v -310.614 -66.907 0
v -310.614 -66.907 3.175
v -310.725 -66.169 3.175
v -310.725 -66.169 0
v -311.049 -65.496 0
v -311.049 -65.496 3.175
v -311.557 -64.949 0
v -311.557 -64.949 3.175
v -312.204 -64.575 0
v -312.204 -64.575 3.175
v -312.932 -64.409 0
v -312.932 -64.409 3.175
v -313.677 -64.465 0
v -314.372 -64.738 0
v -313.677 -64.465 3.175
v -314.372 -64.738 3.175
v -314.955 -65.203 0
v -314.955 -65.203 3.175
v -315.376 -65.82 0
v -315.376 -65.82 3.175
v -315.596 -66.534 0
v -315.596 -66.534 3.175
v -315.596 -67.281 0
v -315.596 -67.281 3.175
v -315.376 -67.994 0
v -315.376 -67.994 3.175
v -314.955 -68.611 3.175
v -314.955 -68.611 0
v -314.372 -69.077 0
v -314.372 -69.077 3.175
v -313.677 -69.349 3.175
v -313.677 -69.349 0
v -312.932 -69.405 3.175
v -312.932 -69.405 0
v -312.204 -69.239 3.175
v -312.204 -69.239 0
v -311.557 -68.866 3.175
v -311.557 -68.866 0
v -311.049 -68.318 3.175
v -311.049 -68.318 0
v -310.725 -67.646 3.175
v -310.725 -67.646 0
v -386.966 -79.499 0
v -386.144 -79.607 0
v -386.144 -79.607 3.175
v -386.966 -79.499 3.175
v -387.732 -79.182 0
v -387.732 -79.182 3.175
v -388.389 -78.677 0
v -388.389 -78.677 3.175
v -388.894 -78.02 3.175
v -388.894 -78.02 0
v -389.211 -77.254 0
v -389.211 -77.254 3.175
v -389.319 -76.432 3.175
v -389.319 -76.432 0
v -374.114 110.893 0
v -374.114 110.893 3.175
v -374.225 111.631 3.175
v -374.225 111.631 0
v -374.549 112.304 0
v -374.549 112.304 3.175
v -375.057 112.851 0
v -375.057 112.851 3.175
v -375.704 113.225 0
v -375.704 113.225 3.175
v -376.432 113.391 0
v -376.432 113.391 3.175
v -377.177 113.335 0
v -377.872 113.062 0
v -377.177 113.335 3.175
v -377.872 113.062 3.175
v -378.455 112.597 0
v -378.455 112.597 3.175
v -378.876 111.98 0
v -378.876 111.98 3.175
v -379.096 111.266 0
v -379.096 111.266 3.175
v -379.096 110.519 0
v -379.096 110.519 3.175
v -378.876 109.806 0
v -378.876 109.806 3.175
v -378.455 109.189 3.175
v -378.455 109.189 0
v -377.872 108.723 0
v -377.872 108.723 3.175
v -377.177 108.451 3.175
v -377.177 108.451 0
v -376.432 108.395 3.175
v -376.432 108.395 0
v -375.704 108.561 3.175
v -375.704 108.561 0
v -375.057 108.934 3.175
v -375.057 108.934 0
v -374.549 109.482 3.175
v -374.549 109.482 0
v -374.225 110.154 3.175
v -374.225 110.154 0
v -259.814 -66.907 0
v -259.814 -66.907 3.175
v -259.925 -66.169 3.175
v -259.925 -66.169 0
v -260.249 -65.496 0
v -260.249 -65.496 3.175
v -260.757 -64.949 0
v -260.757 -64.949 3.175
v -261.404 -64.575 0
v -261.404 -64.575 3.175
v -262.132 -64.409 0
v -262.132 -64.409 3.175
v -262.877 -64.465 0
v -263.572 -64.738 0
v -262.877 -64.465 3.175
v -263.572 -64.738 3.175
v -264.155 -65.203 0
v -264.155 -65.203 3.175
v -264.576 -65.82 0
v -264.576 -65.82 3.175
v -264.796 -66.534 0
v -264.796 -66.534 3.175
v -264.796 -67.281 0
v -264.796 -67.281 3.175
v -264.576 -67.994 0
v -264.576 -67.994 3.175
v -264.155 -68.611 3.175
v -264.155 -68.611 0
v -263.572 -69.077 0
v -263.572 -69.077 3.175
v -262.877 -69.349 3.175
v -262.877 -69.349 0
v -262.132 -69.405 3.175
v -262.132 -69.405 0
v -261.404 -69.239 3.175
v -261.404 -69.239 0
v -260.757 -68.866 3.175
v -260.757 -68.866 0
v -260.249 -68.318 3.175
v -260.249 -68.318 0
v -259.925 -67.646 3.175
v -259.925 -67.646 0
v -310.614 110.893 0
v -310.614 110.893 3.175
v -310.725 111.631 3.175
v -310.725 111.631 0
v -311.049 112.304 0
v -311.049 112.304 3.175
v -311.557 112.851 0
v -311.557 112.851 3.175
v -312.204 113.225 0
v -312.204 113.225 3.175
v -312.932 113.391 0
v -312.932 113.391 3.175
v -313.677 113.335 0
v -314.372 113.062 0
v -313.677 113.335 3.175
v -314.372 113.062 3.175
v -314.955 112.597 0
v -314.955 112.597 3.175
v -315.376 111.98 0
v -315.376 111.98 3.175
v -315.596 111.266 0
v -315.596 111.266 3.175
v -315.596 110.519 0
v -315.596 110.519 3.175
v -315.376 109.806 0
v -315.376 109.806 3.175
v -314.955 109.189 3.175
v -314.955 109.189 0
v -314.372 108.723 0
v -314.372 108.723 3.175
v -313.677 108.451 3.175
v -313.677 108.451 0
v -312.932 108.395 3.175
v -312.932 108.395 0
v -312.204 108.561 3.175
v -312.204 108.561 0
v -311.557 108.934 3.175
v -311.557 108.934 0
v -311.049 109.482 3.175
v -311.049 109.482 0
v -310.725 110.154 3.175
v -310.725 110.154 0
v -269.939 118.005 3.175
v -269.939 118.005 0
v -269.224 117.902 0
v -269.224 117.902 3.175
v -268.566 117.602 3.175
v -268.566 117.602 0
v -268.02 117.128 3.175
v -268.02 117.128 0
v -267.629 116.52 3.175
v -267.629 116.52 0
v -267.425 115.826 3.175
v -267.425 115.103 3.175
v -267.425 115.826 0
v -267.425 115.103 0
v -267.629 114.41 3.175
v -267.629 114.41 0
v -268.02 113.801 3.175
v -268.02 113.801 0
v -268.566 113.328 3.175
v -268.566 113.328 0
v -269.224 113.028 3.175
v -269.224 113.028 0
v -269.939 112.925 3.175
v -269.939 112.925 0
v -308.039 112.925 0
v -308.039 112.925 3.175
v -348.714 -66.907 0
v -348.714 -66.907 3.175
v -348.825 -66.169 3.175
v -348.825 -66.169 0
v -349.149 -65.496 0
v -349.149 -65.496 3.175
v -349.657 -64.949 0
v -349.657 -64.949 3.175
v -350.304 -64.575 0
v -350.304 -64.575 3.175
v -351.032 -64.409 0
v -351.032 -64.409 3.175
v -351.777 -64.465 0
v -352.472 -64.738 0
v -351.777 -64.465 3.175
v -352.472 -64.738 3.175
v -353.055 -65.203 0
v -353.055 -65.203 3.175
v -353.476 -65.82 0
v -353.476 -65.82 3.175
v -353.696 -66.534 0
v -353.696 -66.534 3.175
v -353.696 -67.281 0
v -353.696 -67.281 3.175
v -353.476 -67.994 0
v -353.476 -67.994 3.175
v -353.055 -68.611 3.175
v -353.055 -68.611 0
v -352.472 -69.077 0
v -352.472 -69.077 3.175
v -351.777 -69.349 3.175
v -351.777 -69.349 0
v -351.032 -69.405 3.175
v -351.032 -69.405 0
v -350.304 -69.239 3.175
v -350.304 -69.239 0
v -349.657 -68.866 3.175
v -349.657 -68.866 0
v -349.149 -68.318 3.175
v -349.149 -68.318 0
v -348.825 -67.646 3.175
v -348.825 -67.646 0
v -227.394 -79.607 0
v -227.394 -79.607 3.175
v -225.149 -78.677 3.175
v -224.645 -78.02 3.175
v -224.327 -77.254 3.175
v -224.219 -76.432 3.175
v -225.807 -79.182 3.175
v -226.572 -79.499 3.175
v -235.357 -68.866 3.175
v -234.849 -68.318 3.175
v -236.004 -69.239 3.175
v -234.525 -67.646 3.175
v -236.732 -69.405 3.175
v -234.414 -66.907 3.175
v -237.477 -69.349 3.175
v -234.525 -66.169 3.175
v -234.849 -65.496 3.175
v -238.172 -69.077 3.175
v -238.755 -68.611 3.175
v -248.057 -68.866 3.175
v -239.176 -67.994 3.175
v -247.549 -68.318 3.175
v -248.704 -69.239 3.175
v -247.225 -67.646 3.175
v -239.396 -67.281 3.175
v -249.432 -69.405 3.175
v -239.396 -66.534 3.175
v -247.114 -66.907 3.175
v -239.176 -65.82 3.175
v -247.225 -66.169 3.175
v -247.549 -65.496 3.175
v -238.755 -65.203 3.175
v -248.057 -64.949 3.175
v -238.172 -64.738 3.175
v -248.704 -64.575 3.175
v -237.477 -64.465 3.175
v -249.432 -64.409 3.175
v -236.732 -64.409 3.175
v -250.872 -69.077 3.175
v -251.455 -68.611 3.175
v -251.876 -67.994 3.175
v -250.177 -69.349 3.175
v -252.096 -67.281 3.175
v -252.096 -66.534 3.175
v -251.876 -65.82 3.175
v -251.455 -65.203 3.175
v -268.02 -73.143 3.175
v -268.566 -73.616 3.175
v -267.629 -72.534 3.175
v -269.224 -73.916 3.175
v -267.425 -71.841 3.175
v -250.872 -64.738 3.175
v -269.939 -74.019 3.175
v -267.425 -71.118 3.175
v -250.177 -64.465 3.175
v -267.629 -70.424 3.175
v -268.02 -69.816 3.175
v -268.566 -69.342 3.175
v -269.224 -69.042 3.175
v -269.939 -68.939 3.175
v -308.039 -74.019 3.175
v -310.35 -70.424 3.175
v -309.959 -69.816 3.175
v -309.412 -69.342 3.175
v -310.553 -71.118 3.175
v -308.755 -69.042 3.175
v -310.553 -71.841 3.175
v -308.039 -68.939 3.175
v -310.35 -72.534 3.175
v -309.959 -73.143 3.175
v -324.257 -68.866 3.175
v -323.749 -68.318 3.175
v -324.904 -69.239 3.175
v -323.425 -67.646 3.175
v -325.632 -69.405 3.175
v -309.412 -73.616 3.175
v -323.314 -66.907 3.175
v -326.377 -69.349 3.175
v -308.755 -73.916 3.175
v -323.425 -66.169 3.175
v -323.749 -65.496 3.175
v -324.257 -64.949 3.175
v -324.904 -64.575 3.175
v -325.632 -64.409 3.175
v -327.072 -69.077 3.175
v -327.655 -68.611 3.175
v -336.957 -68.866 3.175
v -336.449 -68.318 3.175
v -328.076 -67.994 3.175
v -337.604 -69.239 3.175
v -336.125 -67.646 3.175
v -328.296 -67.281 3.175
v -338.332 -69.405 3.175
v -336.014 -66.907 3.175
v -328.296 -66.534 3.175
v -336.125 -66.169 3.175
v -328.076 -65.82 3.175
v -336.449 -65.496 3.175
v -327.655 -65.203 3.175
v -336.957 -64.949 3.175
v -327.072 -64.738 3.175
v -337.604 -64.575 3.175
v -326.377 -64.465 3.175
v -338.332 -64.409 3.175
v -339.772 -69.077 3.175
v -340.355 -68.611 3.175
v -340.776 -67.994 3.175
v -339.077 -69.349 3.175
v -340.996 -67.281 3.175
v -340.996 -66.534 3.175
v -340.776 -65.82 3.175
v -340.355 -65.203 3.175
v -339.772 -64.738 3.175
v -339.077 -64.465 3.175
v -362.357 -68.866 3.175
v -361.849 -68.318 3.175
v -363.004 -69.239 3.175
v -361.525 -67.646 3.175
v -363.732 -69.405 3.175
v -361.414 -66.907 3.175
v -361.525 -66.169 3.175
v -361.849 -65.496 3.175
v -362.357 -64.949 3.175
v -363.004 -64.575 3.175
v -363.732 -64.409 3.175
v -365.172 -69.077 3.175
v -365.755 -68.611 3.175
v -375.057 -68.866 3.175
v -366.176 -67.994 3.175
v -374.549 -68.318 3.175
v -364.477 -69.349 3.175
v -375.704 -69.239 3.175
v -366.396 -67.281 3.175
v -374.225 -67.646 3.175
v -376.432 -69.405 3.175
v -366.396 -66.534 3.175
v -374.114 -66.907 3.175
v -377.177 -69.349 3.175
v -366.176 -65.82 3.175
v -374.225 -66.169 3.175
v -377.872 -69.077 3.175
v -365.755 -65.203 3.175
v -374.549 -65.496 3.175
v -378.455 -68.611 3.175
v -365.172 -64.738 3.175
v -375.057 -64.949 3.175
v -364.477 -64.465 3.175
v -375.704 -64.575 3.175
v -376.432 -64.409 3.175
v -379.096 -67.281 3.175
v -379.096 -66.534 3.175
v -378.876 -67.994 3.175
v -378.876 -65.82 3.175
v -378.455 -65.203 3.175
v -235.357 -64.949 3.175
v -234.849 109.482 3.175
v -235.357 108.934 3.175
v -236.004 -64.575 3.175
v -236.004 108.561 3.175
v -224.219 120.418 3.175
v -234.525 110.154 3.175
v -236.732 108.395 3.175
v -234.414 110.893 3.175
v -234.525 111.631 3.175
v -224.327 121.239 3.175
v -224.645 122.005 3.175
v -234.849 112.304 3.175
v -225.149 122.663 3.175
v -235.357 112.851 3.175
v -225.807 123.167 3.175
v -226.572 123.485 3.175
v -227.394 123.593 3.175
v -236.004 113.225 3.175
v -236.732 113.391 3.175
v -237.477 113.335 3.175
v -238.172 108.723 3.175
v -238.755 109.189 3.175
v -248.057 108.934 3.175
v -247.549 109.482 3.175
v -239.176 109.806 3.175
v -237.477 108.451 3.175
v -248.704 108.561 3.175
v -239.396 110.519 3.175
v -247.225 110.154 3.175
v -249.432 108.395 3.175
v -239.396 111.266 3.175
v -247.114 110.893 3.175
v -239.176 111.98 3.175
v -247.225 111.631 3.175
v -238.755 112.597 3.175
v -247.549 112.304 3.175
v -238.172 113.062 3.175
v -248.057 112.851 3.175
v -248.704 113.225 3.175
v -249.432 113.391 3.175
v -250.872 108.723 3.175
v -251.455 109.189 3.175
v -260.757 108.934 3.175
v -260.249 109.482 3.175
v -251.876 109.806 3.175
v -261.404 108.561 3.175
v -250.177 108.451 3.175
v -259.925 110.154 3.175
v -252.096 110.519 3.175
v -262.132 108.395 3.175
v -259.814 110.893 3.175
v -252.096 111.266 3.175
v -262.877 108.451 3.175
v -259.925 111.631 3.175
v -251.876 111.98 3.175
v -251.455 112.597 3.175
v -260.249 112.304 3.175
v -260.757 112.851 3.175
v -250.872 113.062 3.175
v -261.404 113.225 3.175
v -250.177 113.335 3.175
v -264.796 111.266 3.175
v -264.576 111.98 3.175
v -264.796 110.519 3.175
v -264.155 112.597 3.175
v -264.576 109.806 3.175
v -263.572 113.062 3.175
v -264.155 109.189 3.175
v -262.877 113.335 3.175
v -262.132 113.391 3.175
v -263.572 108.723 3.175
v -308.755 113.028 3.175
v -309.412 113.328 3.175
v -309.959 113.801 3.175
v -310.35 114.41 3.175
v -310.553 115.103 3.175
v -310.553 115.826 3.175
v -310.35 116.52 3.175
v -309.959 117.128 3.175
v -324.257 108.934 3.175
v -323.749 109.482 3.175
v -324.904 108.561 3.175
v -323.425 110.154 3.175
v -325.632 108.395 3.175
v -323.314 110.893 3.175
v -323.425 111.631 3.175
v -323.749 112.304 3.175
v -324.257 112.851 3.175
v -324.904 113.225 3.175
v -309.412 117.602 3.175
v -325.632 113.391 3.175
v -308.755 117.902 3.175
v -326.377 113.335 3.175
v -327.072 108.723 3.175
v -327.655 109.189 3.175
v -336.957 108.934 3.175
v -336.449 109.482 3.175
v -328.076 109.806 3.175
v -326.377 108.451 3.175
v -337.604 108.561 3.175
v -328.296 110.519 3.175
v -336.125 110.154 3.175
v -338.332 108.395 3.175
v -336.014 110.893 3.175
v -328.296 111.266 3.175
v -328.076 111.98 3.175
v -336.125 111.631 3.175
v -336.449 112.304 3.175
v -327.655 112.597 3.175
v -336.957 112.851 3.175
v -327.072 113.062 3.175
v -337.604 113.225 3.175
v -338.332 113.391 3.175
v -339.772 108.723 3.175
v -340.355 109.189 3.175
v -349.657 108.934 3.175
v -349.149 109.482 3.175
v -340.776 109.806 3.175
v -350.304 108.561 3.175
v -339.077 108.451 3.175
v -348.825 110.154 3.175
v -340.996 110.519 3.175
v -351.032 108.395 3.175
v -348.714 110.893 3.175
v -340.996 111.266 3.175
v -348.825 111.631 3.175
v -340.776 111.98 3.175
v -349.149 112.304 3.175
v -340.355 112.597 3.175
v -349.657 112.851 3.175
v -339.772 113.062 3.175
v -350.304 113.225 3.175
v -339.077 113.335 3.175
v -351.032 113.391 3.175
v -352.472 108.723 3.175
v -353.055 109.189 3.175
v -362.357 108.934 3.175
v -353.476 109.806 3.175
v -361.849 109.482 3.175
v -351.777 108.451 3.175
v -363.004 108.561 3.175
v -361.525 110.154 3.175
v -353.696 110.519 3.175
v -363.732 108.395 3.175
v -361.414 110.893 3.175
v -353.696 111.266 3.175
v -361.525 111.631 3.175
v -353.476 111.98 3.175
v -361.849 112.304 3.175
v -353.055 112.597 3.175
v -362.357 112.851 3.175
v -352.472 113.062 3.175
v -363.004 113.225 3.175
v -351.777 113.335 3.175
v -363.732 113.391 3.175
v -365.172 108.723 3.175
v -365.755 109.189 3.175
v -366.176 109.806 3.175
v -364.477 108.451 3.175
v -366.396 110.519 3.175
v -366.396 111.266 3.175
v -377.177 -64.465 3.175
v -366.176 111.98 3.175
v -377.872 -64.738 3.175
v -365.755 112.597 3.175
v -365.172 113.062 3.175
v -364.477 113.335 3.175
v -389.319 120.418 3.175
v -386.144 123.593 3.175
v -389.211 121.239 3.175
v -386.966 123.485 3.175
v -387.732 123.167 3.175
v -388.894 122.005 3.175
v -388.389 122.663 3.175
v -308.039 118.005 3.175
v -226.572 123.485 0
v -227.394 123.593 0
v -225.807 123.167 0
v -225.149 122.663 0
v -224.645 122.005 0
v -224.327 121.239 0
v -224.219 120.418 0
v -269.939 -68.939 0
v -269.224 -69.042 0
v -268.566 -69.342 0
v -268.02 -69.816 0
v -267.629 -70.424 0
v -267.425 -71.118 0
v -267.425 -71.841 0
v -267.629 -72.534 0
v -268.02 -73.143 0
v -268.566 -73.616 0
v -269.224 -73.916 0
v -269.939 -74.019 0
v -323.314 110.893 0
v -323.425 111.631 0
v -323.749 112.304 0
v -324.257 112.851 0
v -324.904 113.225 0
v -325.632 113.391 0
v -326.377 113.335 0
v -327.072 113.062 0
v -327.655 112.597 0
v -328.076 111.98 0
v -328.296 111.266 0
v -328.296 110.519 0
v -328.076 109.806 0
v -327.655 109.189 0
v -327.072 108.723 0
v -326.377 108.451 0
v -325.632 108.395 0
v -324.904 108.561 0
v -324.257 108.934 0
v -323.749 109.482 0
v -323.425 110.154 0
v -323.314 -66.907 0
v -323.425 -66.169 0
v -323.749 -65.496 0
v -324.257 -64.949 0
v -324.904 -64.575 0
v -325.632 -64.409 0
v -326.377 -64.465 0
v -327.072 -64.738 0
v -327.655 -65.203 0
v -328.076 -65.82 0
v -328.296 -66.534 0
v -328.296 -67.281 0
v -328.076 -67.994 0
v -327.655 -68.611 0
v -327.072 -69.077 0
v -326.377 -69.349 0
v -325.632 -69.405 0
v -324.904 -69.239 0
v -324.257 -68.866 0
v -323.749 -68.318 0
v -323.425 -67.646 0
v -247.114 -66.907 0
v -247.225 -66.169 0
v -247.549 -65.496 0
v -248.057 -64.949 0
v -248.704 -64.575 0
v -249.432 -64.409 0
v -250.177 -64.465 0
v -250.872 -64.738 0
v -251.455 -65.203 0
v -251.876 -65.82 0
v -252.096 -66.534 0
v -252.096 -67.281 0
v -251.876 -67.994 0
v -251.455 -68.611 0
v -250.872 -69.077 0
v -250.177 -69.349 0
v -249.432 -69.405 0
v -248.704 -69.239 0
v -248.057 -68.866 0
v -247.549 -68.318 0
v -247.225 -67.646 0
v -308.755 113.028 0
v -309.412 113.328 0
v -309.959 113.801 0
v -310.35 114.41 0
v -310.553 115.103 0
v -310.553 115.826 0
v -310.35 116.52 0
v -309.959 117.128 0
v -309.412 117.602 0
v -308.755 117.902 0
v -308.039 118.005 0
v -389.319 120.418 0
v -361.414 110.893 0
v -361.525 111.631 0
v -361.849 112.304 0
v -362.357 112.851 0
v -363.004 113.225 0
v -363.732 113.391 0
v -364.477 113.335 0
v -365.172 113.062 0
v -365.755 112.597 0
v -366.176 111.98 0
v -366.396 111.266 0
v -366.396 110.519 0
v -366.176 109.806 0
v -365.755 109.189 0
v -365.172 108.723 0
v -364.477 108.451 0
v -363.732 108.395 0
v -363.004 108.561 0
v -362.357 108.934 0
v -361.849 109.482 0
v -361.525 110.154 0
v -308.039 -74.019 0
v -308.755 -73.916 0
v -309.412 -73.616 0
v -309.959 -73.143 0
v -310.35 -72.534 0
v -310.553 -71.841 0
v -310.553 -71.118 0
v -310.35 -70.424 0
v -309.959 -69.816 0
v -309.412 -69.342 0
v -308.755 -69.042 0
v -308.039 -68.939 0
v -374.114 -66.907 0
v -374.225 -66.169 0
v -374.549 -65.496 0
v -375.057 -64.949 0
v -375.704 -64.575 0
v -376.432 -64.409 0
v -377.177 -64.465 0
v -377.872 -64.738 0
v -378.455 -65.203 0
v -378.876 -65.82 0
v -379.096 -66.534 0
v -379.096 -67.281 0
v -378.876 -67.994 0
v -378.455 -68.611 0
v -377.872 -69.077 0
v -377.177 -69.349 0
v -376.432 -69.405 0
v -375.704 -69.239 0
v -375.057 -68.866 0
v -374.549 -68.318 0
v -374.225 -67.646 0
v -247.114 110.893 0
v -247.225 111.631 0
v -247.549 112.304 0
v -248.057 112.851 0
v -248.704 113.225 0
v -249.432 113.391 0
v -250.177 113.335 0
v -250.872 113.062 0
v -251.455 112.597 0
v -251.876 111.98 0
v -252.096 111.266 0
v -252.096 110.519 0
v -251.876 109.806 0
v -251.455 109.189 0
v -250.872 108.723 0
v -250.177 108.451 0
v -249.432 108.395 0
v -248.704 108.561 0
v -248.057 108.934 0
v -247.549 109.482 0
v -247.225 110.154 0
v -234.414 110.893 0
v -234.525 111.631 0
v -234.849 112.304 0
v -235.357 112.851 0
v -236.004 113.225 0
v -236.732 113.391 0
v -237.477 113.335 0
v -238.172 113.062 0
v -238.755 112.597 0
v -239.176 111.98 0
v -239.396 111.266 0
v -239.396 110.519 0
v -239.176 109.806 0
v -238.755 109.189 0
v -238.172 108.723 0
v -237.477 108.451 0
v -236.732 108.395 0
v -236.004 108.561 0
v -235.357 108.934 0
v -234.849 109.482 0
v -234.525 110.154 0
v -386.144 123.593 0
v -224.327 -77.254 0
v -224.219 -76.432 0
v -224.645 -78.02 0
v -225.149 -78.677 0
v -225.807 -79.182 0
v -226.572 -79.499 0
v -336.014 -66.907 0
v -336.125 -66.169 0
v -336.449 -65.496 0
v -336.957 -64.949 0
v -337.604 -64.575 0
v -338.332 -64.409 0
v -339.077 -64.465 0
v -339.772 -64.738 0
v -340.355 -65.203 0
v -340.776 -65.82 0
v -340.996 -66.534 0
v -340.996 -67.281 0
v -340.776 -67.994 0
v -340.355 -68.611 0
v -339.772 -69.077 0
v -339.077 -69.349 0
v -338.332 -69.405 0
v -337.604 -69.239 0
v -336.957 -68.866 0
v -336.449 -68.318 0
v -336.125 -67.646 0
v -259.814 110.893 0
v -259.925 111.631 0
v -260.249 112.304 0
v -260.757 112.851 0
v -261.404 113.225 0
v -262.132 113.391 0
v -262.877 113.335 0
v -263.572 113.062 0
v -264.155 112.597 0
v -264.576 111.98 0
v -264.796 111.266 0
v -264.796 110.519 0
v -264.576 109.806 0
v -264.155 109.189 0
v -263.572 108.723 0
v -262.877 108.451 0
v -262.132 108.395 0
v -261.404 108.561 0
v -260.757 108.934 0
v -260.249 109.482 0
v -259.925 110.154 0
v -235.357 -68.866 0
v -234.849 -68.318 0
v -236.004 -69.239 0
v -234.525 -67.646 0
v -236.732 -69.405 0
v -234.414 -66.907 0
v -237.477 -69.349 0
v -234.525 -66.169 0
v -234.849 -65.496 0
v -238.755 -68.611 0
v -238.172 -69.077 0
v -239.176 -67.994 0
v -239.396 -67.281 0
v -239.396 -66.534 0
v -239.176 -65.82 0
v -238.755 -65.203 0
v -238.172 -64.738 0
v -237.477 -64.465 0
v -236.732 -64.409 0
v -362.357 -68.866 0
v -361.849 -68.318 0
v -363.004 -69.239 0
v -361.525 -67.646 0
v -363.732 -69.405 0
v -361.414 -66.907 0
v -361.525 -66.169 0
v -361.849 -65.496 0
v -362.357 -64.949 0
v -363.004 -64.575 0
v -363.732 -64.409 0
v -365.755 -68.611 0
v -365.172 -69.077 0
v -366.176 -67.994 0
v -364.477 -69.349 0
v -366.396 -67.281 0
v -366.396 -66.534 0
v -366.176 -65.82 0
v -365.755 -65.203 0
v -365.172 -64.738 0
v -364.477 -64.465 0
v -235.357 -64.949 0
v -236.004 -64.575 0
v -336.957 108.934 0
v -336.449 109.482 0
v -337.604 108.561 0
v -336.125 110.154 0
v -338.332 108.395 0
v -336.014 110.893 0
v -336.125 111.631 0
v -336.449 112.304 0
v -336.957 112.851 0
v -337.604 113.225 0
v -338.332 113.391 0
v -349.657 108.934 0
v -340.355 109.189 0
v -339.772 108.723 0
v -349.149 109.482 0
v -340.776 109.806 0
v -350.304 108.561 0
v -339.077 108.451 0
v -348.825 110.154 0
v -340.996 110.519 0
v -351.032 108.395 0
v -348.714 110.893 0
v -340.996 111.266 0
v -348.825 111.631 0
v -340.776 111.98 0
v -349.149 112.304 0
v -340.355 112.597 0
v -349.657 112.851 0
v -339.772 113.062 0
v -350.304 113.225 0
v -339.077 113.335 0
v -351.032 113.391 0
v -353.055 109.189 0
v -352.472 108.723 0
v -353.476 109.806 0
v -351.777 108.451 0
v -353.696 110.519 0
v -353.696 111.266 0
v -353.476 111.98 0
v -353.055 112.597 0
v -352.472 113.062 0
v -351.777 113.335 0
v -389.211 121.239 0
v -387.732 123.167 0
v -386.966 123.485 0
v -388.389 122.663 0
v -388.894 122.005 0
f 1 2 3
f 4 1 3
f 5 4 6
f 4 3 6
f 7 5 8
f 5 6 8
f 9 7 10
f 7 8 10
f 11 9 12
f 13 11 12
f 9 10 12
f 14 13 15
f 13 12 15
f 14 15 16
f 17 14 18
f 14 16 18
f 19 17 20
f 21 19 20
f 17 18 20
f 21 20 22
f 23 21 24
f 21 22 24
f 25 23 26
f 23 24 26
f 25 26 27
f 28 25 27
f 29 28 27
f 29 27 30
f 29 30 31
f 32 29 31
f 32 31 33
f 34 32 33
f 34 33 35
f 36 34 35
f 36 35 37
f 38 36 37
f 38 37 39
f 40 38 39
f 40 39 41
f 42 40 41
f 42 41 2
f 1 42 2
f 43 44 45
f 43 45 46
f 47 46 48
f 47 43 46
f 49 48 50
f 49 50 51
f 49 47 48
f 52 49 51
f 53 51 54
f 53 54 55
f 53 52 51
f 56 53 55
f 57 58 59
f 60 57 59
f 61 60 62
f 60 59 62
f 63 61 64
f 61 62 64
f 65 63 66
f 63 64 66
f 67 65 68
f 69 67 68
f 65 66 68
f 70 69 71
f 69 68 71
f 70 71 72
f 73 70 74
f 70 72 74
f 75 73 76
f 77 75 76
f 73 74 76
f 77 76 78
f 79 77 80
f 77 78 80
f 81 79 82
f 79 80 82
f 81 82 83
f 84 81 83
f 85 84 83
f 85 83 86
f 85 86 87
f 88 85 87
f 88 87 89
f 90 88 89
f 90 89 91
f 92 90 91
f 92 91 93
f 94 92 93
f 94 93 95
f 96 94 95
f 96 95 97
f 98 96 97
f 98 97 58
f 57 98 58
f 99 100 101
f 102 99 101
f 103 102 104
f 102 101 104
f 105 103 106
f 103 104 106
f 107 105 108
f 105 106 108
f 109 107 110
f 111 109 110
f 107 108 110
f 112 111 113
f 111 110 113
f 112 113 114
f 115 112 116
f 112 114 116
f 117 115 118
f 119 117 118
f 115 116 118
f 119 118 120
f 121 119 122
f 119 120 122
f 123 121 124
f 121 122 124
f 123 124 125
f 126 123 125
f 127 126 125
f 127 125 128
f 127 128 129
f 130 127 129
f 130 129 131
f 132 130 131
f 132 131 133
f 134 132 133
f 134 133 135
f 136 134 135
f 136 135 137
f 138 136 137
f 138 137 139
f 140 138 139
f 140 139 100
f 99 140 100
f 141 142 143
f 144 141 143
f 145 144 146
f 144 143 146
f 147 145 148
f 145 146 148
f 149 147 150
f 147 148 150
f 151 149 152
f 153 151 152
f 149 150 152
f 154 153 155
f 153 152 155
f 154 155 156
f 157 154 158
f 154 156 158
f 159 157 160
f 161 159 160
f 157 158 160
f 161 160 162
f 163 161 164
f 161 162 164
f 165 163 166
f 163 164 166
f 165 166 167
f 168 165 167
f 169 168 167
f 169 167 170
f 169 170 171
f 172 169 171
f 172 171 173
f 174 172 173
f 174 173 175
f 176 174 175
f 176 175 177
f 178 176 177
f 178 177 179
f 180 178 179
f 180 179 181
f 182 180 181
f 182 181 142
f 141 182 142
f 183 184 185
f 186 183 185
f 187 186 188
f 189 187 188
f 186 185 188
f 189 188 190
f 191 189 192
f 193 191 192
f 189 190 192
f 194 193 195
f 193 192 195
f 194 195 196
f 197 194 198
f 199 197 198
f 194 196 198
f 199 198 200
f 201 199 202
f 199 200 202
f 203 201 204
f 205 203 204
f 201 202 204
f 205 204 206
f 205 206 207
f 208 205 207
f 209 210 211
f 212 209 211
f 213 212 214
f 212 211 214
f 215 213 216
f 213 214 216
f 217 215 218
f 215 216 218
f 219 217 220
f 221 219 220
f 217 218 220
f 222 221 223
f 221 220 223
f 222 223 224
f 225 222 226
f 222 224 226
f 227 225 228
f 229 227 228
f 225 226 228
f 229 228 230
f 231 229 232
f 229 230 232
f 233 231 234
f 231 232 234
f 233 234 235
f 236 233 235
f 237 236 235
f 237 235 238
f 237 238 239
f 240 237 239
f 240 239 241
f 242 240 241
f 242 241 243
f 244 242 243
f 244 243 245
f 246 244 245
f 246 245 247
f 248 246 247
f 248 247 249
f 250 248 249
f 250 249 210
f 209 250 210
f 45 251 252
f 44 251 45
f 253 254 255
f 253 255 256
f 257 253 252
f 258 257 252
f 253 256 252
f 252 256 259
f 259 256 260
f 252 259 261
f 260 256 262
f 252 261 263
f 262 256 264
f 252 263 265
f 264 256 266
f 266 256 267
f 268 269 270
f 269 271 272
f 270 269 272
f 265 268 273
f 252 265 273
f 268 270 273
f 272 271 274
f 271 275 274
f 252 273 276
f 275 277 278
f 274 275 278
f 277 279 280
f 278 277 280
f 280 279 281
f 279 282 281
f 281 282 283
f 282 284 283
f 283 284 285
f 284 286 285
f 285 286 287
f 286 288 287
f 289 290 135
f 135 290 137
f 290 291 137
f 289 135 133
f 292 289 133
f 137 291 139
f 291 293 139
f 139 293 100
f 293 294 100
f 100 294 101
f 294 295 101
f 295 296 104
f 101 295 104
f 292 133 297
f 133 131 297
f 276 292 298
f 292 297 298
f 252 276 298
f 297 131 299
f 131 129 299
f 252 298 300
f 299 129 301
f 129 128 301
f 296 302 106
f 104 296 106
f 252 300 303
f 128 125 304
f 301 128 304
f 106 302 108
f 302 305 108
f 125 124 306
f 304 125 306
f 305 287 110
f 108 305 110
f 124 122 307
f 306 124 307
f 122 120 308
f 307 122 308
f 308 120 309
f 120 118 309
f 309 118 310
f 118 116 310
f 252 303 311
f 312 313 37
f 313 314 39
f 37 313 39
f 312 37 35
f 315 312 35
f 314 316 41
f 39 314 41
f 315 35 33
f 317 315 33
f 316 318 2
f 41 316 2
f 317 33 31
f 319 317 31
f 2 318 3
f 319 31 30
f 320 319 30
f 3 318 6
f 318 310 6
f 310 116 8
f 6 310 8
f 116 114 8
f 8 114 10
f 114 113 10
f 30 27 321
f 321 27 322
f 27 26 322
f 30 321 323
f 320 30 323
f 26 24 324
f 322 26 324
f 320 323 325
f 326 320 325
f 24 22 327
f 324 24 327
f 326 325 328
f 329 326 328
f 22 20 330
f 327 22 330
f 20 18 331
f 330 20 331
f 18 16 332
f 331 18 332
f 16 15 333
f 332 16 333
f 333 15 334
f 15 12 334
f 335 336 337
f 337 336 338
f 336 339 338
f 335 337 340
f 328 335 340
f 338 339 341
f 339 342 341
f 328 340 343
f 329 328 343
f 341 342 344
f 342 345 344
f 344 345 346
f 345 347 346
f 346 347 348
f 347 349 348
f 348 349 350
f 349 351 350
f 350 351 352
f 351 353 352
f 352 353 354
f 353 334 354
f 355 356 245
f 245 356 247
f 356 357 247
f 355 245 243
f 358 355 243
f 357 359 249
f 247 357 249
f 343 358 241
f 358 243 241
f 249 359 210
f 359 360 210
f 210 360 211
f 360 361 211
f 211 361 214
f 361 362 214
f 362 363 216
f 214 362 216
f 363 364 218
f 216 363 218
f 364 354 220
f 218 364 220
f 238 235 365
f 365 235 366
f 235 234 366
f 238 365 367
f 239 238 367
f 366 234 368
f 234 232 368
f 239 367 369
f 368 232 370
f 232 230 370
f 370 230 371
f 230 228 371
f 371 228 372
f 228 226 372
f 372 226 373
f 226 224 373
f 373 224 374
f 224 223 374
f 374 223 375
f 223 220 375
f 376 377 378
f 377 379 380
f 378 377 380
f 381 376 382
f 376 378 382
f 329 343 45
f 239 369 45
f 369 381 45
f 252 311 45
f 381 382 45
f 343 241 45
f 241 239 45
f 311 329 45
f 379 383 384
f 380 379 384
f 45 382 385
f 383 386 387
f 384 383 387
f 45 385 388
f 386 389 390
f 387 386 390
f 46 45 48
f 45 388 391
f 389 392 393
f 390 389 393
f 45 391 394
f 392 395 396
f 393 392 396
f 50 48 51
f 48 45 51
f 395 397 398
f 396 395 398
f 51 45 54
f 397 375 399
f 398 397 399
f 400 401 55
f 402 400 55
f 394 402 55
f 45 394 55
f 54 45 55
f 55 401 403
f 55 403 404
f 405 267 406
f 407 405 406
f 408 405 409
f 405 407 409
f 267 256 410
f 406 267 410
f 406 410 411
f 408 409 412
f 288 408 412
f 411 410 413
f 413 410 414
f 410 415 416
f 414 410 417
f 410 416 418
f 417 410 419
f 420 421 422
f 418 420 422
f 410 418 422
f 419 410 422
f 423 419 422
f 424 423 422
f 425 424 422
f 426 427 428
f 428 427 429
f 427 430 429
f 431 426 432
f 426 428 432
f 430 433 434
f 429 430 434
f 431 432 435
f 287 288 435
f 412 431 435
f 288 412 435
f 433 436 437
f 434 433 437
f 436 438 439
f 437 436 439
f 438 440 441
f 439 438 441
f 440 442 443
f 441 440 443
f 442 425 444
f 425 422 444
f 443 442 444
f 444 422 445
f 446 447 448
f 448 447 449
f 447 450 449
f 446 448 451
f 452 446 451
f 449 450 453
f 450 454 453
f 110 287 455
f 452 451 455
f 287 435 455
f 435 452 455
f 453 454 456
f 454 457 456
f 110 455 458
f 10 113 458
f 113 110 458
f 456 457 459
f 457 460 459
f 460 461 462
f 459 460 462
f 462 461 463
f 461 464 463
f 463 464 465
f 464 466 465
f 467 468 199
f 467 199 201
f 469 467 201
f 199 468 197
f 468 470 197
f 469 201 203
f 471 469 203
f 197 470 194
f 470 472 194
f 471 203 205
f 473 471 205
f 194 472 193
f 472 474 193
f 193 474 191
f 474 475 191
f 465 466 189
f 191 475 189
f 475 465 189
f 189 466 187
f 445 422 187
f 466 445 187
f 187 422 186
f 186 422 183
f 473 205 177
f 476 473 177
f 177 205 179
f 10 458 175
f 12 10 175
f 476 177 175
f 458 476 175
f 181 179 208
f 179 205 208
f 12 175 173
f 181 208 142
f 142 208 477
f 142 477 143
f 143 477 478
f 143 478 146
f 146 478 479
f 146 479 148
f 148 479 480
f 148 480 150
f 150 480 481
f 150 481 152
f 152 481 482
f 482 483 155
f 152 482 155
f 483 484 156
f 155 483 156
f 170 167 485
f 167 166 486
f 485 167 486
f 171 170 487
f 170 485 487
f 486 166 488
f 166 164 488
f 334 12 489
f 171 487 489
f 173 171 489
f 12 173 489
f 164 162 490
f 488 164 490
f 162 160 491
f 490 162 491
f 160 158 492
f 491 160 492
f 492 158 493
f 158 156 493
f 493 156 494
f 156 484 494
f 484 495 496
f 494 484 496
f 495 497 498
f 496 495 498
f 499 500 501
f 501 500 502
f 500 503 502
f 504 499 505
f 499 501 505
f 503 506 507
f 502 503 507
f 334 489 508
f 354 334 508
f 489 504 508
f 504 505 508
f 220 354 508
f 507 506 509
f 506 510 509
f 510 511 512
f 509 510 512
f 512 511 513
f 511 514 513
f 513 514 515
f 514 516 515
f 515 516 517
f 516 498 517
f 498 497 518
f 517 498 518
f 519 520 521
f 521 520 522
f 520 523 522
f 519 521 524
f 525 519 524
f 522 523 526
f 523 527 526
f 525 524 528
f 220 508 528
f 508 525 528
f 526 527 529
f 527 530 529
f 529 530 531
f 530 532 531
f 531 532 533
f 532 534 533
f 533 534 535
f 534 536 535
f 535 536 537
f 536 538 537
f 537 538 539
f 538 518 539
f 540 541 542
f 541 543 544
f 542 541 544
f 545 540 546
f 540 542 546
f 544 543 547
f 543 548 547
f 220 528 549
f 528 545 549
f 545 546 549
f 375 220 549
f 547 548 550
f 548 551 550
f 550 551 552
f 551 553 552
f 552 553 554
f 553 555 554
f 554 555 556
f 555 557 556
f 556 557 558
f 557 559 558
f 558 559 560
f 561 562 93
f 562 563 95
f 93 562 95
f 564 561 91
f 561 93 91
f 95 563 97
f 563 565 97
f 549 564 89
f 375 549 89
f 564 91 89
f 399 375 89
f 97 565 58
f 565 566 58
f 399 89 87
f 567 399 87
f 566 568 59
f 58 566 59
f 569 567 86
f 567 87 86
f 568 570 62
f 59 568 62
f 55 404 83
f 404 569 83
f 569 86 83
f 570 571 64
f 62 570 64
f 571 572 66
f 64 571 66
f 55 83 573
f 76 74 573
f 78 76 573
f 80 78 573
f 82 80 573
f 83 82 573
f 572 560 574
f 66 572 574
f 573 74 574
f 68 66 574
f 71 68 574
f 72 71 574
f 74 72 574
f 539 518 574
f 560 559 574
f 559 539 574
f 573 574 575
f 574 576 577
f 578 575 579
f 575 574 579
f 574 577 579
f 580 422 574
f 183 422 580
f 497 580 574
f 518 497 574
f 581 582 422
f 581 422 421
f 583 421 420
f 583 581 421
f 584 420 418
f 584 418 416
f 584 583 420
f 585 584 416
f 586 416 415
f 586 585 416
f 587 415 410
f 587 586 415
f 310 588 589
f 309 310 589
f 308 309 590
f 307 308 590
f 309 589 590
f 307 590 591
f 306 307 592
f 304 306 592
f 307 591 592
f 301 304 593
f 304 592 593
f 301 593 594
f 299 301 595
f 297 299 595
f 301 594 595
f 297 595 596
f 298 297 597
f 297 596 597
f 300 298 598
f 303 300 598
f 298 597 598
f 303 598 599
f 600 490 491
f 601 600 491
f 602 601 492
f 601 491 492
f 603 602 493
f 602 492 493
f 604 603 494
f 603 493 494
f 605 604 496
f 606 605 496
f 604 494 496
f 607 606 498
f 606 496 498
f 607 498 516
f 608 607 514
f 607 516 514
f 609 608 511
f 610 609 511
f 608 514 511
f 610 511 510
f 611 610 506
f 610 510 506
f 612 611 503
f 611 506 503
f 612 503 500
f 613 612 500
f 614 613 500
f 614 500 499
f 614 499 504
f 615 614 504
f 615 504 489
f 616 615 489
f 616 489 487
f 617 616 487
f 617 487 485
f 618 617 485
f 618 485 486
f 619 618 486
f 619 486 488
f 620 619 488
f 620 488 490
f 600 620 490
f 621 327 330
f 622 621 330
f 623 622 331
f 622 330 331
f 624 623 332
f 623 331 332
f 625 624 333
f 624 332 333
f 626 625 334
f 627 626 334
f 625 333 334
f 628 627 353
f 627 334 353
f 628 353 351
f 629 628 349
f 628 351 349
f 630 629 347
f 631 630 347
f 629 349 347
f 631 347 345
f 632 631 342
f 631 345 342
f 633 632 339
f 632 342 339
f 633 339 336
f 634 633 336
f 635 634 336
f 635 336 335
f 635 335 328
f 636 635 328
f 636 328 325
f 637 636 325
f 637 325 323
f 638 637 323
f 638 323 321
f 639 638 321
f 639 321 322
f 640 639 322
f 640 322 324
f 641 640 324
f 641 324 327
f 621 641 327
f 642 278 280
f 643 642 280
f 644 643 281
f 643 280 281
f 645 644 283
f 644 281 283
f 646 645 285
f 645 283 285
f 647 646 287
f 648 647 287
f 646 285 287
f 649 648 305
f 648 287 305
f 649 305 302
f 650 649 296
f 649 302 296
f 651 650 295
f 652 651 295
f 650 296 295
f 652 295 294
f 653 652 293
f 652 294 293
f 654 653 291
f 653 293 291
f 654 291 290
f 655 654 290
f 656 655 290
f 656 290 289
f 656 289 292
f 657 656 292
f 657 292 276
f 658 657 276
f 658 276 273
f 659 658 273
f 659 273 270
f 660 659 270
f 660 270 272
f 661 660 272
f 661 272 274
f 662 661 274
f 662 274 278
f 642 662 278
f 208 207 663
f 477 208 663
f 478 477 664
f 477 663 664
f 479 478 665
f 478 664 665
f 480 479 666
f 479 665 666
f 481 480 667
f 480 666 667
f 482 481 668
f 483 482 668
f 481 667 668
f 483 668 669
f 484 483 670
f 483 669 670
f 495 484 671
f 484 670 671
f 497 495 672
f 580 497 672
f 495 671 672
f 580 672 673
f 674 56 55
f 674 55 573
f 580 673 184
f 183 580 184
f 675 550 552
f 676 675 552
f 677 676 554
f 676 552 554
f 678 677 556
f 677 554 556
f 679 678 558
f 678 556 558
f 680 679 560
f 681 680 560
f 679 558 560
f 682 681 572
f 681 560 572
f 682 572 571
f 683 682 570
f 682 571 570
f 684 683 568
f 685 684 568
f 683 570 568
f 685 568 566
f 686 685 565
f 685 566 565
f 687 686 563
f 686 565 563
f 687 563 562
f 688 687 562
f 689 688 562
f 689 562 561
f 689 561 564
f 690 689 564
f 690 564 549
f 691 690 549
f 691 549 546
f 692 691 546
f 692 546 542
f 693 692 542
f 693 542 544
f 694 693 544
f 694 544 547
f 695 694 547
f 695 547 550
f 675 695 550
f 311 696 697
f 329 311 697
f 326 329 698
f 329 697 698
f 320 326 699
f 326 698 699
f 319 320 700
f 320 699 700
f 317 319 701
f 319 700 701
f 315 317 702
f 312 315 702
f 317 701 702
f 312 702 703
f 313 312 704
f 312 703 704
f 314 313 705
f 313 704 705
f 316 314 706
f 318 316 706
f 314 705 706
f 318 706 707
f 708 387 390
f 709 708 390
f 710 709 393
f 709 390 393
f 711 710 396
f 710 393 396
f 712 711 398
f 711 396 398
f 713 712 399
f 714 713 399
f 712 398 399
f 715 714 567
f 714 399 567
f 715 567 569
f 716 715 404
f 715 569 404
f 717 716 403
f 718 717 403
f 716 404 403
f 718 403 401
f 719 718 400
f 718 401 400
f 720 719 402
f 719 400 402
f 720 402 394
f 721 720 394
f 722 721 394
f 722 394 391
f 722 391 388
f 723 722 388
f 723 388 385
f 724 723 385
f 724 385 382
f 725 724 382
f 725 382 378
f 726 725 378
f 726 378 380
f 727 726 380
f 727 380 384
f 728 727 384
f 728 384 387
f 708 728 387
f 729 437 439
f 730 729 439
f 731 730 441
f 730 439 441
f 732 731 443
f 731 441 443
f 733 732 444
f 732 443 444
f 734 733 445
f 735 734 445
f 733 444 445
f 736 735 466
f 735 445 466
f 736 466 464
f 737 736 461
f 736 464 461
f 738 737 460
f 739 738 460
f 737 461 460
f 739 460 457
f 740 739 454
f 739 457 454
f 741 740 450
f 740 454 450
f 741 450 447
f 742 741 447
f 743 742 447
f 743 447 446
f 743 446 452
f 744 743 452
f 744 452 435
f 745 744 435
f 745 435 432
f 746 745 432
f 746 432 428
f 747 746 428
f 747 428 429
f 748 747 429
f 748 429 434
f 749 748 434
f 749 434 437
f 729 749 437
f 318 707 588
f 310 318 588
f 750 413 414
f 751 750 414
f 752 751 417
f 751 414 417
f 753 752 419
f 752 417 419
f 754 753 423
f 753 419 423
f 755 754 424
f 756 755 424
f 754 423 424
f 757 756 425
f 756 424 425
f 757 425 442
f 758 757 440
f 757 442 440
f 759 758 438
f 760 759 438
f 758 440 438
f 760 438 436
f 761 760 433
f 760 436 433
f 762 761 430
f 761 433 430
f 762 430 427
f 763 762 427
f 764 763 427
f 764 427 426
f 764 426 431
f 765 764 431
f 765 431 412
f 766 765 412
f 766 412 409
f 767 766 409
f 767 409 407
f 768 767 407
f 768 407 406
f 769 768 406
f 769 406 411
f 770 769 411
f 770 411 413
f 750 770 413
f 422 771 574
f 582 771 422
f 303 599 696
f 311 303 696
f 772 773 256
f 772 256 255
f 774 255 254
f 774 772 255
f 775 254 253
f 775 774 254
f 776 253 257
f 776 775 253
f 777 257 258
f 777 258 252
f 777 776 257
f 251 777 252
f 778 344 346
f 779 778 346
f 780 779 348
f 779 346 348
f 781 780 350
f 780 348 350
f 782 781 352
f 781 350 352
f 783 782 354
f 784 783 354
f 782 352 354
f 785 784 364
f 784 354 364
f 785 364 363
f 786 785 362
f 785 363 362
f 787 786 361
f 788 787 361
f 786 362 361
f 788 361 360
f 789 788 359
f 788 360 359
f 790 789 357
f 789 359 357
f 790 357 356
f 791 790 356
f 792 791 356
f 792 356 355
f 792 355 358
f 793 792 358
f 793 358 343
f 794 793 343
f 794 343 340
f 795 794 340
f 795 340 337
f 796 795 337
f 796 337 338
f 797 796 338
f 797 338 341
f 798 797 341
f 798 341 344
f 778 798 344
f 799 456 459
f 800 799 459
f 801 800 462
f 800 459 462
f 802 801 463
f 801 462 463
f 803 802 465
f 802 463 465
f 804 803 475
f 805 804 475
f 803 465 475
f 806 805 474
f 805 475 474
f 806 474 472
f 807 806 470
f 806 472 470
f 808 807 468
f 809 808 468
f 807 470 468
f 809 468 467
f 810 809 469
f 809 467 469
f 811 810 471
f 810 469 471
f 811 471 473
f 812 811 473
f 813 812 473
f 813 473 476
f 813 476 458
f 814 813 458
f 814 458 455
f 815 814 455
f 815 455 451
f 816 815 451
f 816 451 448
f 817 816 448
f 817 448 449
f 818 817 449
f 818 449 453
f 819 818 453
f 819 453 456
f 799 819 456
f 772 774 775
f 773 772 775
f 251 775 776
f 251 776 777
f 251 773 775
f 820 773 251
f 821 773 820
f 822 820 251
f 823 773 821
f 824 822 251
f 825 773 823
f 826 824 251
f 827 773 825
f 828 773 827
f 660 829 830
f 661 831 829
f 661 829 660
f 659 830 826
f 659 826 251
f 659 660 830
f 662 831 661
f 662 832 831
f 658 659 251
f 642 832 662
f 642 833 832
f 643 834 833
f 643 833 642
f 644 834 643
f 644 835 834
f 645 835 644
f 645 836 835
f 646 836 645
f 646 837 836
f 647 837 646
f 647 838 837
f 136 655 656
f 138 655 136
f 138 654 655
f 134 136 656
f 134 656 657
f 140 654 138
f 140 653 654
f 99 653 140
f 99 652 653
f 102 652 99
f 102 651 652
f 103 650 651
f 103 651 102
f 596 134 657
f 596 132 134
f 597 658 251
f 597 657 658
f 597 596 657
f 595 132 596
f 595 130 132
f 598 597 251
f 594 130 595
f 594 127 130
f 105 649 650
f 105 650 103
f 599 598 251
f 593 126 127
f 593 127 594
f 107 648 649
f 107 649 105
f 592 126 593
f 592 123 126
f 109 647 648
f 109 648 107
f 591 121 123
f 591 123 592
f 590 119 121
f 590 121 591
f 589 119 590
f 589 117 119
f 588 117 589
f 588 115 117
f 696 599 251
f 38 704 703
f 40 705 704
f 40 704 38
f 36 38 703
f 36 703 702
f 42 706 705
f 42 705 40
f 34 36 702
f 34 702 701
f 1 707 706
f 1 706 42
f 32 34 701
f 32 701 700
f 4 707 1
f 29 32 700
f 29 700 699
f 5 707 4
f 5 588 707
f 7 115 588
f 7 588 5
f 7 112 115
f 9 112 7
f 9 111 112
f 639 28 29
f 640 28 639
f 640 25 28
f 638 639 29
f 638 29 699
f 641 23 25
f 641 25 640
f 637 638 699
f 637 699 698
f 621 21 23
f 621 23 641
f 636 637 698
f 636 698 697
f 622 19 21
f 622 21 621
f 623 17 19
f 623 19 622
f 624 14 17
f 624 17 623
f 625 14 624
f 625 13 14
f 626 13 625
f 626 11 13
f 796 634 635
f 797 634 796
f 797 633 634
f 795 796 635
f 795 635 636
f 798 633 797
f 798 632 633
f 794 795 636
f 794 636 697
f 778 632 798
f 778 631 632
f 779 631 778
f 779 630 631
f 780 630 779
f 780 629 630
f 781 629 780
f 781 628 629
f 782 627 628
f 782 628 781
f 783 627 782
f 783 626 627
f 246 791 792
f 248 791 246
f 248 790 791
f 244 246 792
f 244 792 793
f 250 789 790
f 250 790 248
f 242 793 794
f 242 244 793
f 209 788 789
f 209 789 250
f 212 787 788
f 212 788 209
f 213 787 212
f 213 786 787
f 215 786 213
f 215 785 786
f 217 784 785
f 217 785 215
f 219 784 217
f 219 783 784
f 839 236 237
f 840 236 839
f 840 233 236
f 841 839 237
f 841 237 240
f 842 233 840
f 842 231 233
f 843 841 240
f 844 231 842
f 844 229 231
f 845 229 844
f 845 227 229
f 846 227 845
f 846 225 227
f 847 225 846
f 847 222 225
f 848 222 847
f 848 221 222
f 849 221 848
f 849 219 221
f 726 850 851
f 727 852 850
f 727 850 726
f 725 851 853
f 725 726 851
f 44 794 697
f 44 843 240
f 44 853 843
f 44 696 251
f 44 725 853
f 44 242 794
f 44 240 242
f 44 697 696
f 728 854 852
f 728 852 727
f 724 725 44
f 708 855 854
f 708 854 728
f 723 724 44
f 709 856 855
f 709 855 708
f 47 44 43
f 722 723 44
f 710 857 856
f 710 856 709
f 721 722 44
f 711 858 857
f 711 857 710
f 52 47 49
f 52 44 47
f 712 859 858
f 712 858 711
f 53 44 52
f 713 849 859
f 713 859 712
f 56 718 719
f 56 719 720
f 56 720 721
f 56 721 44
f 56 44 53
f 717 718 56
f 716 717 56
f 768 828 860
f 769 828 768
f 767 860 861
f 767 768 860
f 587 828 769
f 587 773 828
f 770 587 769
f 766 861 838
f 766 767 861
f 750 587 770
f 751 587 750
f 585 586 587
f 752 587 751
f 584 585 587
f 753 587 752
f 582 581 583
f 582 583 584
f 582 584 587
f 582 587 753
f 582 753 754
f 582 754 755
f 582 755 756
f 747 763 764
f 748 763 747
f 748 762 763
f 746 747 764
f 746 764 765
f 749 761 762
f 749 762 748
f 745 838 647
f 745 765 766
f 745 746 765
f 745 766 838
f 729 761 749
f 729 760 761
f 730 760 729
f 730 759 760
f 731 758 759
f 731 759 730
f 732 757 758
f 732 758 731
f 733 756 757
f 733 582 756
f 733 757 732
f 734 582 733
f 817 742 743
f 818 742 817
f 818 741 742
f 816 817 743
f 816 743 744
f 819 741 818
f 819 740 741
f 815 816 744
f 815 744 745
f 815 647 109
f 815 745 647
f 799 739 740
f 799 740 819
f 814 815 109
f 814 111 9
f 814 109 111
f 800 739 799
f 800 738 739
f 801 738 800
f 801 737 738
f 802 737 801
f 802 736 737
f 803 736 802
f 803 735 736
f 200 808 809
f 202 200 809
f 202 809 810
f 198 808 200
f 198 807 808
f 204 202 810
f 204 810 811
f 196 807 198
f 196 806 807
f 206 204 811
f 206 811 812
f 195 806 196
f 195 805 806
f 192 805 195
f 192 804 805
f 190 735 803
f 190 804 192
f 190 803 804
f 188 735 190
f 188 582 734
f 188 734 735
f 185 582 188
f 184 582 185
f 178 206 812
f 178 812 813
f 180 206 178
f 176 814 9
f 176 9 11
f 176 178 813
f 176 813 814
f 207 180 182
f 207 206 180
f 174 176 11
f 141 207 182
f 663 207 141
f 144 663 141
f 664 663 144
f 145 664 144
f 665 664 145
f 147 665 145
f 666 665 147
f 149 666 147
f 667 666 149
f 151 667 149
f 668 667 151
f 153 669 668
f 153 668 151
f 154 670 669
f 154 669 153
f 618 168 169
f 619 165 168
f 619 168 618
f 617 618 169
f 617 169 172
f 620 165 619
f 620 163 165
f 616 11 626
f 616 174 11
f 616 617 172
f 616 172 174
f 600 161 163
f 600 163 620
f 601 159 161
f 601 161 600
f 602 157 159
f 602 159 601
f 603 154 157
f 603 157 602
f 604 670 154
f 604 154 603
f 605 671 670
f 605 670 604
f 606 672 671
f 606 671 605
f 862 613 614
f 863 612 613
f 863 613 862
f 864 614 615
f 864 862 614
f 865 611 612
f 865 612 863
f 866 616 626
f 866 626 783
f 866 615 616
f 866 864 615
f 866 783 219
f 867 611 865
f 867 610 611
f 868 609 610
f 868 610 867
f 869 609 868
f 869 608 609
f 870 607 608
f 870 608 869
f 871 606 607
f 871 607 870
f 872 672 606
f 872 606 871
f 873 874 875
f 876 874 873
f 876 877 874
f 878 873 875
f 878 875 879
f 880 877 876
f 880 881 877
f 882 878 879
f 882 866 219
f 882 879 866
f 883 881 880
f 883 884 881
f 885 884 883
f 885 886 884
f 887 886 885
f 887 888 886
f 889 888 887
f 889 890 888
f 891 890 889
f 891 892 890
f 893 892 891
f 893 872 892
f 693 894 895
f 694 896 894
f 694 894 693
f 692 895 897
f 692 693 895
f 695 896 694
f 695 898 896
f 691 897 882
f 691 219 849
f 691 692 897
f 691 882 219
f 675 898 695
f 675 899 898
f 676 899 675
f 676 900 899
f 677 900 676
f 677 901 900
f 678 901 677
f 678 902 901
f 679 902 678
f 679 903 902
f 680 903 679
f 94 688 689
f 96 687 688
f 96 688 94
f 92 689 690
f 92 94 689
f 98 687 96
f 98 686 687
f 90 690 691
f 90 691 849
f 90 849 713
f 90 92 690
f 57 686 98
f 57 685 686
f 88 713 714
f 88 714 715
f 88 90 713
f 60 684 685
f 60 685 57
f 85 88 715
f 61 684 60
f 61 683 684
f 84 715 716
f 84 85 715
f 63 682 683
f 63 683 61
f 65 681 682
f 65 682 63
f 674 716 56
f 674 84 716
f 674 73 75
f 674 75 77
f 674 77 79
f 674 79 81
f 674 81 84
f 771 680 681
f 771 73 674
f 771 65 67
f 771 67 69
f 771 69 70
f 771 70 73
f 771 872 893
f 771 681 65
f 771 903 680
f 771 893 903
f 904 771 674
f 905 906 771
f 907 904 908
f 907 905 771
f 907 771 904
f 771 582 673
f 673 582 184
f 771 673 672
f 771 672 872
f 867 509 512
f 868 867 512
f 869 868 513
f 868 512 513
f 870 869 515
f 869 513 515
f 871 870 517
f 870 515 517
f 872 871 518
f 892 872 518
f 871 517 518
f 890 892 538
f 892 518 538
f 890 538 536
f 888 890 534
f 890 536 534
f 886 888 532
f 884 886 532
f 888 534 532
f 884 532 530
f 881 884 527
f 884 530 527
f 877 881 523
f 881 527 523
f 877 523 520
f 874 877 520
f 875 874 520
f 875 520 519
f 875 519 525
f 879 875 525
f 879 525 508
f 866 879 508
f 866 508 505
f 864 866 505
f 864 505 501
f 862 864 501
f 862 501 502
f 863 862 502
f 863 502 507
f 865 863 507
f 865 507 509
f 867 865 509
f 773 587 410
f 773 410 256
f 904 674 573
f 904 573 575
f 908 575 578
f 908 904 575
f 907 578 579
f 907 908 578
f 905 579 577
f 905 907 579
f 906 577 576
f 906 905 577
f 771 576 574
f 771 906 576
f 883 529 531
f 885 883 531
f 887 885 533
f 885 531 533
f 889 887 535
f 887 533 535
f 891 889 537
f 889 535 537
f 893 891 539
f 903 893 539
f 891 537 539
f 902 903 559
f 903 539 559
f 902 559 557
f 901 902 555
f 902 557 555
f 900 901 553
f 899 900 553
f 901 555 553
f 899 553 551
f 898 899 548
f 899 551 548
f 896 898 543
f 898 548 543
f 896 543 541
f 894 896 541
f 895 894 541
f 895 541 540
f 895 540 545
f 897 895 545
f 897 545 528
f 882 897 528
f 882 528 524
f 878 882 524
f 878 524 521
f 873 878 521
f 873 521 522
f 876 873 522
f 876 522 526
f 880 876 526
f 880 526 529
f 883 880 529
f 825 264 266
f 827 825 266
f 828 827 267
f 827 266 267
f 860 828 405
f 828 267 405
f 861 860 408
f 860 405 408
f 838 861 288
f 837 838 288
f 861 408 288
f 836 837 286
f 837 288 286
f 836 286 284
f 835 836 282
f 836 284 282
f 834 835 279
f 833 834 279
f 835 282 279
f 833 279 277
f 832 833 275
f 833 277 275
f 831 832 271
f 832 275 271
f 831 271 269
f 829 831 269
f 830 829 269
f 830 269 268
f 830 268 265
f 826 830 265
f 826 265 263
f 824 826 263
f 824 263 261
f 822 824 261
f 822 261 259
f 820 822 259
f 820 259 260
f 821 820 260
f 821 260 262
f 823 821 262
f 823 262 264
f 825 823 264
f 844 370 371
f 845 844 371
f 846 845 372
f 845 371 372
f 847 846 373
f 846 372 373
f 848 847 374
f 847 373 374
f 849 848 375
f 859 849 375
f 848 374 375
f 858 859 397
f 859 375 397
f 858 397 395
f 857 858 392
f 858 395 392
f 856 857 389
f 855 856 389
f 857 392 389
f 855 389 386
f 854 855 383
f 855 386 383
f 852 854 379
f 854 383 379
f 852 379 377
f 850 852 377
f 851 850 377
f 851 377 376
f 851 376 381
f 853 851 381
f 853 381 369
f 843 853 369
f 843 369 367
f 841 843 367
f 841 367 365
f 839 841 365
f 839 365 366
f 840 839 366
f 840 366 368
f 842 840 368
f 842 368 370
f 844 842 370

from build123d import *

# Parameters (mm, degrees)
BOSS_EXTRUDE1_DEPTH = 3.175
SKETCH3_R           = 2.505
CUT_EXTRUDE4_DEPTH  = 4.175


with BuildPart() as part:
    # Sketch1 → Boss-Extrude1 (new body)
    with BuildSketch(Plane.XY):
        with BuildLine():
            Line((-227.394146502, -79.607268705), (-386.144146502, -79.607268705))
            ThreePointArc((-386.144146502, -79.607268705), (-388.389210532, -78.677332735), (-389.319146502, -76.432268705))
            Line((-389.319146502, -76.432268705), (-389.319146502, 120.417731295))
            ThreePointArc((-389.319146502, 120.417731295), (-388.389210532, 122.662795325), (-386.144146502, 123.592731295))
            Line((-386.144146502, 123.592731295), (-227.394146502, 123.592731295))
            ThreePointArc((-227.394146502, 123.592731295), (-225.149082471, 122.662795325), (-224.219146502, 120.417731295))
            Line((-224.219146502, 120.417731295), (-224.219146502, -76.432268705))
            ThreePointArc((-224.219146502, -76.432268705), (-225.149082471, -78.677332735), (-227.394146502, -79.607268705))
        make_face()
        with BuildLine():
            Line((-308.039146502, 118.004731295), (-269.939146502, 118.004731295))
            ThreePointArc((-269.939146502, 118.004731295), (-267.399146502, 115.464731295), (-269.939146502, 112.924731295))
            Line((-269.939146502, 112.924731295), (-308.039146502, 112.924731295))
            ThreePointArc((-308.039146502, 112.924731295), (-310.579146502, 115.464731295), (-308.039146502, 118.004731295))
        make_face(mode=Mode.SUBTRACT)
        with BuildLine():
            Line((-308.039146502, -68.939268705), (-269.939146502, -68.939268705))
            ThreePointArc((-269.939146502, -68.939268705), (-267.399146502, -71.479268705), (-269.939146502, -74.019268705))
            Line((-269.939146502, -74.019268705), (-308.039146502, -74.019268705))
            ThreePointArc((-308.039146502, -74.019268705), (-310.579146502, -71.479268705), (-308.039146502, -68.939268705))
        make_face(mode=Mode.SUBTRACT)
    extrude(amount=BOSS_EXTRUDE1_DEPTH)

    # Sketch3 → Cut-Extrude4 (cut, through all)
    with BuildSketch(Plane.XY.offset(3.175)):
        with Locations((-376.619146502, 110.892731295)):
            Circle(SKETCH3_R)
        with Locations((-376.619146502, -66.907268705)):
            Circle(SKETCH3_R)
        with Locations((-363.919146502, 110.892731295)):
            Circle(SKETCH3_R)
        with Locations((-363.919146502, -66.907268705)):
            Circle(SKETCH3_R)
        with Locations((-351.219146502, 110.892731295)):
            Circle(SKETCH3_R)
        with Locations((-351.219146502, -66.907268705)):
            Circle(SKETCH3_R)
        with Locations((-338.519146502, 110.892731295)):
            Circle(SKETCH3_R)
        with Locations((-338.519146502, -66.907268705)):
            Circle(SKETCH3_R)
        with Locations((-325.819146502, 110.892731295)):
            Circle(SKETCH3_R)
        with Locations((-325.819146502, -66.907268705)):
            Circle(SKETCH3_R)
        with Locations((-313.119146502, 110.892731295)):
            Circle(SKETCH3_R)
        with Locations((-313.119146502, -66.907268705)):
            Circle(SKETCH3_R)
        with Locations((-236.919146502, 110.892731295)):
            Circle(SKETCH3_R)
        with Locations((-236.919146502, -66.907268705)):
            Circle(SKETCH3_R)
        with Locations((-249.619146502, -66.907268705)):
            Circle(SKETCH3_R)
        with Locations((-249.619146502, 110.892731295)):
            Circle(SKETCH3_R)
        with Locations((-262.319146502, -66.907268705)):
            Circle(SKETCH3_R)
        with Locations((-262.319146502, 110.892731295)):
            Circle(SKETCH3_R)
    extrude(amount=-CUT_EXTRUDE4_DEPTH, mode=Mode.SUBTRACT)


solid = part.part
